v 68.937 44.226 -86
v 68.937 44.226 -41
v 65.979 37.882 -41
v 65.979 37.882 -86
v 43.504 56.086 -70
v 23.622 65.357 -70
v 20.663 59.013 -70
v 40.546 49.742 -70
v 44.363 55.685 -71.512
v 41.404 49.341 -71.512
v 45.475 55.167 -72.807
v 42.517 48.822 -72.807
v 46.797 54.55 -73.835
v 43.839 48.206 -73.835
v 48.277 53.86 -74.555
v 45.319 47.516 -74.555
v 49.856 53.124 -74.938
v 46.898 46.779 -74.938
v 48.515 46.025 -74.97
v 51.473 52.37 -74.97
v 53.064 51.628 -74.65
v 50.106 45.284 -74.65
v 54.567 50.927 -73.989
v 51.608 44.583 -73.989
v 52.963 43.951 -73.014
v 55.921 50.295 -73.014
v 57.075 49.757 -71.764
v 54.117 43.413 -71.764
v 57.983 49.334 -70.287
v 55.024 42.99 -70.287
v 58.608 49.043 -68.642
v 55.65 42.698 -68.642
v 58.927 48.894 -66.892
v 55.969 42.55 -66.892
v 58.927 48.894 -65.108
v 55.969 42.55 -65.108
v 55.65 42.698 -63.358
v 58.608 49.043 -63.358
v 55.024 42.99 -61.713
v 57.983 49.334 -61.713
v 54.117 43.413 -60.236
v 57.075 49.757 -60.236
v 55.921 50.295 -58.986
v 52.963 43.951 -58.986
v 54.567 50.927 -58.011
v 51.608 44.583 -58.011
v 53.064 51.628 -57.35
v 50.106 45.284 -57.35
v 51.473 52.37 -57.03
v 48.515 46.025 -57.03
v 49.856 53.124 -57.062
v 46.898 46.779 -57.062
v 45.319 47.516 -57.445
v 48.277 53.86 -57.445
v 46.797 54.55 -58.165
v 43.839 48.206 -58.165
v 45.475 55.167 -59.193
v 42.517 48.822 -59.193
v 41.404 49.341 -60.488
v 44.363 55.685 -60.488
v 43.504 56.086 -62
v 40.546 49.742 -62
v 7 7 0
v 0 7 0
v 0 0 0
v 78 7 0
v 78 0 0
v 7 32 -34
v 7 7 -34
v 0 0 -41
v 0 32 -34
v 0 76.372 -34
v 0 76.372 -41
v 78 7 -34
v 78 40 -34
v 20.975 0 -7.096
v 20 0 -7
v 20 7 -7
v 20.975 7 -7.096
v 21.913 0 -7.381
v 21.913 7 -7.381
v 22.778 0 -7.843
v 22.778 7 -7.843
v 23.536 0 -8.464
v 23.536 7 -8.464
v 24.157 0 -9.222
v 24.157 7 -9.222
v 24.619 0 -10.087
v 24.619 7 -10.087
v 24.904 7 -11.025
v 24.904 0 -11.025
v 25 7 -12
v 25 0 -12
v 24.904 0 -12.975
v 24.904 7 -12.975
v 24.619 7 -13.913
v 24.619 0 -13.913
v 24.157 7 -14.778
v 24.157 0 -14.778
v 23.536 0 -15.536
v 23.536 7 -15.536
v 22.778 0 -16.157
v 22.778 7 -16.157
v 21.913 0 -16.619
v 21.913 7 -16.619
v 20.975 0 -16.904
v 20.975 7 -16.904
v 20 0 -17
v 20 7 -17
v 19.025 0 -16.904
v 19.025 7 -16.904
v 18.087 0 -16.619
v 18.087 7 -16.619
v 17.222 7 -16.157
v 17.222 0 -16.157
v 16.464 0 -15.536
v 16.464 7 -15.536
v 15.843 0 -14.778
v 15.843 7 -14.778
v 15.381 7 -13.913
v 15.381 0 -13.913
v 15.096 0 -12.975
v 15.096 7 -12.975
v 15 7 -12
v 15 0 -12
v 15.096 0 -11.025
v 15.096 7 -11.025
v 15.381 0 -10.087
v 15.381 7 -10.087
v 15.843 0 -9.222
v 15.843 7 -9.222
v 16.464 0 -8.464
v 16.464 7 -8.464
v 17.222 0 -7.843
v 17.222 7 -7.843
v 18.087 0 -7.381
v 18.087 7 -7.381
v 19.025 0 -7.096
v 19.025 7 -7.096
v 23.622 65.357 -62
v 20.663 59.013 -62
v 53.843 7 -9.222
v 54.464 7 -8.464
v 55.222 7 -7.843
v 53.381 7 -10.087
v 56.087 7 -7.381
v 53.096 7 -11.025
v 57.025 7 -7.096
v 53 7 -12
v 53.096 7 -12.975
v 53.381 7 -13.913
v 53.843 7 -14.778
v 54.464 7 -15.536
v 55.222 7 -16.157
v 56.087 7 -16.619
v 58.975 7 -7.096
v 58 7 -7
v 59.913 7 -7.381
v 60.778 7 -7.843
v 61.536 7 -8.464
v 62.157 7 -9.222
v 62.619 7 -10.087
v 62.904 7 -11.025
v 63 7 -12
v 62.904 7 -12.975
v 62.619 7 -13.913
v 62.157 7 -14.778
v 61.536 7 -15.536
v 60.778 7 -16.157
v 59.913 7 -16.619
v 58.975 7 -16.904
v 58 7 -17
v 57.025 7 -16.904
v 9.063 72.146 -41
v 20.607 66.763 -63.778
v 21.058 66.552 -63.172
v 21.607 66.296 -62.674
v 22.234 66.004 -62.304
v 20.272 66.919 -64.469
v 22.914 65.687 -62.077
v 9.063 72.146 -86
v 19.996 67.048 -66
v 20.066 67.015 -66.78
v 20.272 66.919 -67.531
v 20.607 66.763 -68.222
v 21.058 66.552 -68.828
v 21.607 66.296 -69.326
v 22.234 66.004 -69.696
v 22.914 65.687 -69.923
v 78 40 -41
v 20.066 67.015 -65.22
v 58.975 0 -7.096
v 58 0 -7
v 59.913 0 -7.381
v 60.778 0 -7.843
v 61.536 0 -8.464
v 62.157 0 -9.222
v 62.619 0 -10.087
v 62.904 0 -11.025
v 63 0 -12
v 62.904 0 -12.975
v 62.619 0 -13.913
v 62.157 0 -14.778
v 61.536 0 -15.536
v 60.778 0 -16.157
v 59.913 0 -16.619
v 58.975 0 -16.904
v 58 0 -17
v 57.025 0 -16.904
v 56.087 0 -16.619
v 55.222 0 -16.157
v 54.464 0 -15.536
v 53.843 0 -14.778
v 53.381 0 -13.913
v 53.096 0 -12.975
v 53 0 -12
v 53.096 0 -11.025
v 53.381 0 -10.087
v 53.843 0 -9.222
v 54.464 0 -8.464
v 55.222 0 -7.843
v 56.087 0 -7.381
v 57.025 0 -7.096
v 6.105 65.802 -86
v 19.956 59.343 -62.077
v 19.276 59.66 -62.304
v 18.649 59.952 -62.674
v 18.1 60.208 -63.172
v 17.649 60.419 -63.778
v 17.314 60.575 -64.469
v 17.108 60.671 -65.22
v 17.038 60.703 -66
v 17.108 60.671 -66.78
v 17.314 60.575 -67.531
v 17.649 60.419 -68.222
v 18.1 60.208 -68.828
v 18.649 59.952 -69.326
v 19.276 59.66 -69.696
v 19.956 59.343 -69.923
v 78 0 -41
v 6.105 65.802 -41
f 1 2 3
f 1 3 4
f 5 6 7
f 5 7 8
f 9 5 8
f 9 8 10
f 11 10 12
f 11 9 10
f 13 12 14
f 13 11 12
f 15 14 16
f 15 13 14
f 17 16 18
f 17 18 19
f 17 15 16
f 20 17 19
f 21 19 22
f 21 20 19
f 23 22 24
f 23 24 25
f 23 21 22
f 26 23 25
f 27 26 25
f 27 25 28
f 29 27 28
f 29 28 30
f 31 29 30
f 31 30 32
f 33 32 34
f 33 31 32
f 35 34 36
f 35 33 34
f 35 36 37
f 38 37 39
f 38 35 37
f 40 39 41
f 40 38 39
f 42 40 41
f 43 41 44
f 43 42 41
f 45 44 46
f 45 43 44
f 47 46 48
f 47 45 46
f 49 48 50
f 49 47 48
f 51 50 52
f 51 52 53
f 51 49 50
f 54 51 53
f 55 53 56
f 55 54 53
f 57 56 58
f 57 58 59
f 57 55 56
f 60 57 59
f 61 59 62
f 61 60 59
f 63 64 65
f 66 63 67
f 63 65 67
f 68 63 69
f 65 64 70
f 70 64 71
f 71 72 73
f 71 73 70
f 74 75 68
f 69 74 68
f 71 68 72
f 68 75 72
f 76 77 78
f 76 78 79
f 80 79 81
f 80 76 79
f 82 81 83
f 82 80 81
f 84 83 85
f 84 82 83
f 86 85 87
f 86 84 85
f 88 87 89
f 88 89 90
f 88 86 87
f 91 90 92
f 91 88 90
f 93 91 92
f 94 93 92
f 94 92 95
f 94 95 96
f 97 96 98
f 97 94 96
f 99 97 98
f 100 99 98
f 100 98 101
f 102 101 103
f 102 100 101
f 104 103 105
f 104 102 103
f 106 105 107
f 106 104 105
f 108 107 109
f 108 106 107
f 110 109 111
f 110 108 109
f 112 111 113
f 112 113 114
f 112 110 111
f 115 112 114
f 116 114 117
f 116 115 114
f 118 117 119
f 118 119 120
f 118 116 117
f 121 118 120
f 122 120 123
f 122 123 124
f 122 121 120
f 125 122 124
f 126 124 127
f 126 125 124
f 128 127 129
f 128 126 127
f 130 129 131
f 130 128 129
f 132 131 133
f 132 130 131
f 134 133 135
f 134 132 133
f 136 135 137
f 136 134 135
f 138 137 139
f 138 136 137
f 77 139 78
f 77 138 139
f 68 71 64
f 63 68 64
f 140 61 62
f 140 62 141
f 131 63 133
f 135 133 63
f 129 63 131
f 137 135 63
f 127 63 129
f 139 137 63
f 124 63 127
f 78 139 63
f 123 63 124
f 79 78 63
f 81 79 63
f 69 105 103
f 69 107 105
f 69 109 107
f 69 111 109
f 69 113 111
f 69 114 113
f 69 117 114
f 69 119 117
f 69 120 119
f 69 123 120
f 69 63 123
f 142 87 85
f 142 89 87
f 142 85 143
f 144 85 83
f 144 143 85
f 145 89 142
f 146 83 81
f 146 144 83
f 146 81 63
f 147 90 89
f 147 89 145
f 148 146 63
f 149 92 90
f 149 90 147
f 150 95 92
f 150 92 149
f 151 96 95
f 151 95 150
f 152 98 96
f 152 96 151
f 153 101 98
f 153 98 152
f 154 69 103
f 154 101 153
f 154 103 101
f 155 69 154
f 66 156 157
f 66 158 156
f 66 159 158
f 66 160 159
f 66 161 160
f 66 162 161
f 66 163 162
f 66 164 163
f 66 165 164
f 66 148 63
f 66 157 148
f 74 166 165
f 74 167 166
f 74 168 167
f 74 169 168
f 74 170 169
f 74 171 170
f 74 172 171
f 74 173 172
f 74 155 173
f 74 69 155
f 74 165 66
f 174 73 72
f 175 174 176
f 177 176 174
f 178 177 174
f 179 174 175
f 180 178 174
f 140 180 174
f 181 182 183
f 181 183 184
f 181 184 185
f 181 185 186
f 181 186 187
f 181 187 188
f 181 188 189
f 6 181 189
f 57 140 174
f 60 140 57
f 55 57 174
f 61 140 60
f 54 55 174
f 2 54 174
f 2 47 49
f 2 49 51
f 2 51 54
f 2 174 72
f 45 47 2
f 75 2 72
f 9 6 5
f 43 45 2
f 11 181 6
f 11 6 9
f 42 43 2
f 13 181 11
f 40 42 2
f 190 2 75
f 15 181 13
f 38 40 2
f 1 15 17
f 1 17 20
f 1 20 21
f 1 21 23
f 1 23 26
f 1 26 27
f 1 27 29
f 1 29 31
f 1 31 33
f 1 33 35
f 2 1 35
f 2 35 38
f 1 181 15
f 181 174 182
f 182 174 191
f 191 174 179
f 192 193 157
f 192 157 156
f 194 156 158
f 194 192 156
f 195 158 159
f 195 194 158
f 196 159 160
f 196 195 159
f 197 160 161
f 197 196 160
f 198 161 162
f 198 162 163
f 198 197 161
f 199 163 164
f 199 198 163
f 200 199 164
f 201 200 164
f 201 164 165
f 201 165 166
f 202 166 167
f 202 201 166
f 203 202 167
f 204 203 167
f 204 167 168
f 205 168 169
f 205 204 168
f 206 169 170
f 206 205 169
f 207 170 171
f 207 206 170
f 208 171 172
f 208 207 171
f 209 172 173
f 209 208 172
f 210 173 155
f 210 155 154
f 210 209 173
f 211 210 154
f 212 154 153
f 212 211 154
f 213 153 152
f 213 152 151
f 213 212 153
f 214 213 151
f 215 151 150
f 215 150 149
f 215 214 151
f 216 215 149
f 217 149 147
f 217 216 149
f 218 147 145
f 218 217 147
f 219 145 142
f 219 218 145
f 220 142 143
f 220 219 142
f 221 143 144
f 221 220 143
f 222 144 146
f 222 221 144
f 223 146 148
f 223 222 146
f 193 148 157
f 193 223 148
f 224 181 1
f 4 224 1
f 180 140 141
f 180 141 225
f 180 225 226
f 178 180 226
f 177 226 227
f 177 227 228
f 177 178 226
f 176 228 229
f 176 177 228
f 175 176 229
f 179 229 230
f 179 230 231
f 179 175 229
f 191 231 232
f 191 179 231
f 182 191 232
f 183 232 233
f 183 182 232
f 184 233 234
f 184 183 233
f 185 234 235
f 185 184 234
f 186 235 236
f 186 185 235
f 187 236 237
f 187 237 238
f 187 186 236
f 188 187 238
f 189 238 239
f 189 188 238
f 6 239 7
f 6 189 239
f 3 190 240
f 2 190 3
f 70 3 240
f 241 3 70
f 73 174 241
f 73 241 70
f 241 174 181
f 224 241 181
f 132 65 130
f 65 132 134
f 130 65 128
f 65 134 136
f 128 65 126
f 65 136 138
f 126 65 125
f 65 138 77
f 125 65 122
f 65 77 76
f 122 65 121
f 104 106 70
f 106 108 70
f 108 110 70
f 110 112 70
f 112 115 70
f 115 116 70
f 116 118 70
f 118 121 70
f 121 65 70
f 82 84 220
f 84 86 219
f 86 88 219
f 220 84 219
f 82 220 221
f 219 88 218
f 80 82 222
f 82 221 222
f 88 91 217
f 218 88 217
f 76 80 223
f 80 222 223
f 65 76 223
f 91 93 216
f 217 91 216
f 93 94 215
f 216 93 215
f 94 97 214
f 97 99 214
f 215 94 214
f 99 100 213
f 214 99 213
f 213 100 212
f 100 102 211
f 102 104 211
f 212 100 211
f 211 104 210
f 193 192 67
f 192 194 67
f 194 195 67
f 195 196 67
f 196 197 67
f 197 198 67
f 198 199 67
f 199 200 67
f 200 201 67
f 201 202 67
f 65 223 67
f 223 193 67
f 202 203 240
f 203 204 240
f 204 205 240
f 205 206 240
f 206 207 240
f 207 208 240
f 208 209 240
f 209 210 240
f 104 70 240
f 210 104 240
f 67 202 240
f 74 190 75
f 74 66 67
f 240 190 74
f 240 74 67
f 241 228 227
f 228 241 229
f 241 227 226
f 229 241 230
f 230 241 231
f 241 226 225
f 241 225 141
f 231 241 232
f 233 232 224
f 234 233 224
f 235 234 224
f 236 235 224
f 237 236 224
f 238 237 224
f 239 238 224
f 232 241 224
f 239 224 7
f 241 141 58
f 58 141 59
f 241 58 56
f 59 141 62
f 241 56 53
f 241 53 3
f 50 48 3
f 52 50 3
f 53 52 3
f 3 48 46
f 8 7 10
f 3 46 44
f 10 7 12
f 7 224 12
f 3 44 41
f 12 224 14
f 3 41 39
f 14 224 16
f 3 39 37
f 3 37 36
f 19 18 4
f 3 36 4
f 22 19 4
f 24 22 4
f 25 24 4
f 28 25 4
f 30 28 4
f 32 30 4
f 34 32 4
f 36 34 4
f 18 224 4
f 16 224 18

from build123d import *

# Parameters (mm, degrees)
SKETCH1_W           = 78
SKETCH1_H           = 41
SKETCH1_R           = 5
BOSS_EXTRUDE1_DEPTH = 7
BOSS_EXTRUDE3_START = -41
BOSS_EXTRUDE3_DEPTH = 7
BOSS_EXTRUDE6_DEPTH = 7
SKETCH10_W          = 66.063477679
SKETCH10_H          = 45
BOSS_EXTRUDE7_DEPTH = 7


with BuildPart() as part:
    # Sketch1 → Boss-Extrude1 (new body)
    with BuildSketch(Plane(origin=(0, 0, 0), x_dir=(1, 0, 0), z_dir=(0, 1, 0))):
        with Locations((39, 20.5)):
            Rectangle(SKETCH1_W, SKETCH1_H)
        with Locations(Location((20, 12, 0), (0, 0, 270))):
            Circle(SKETCH1_R, mode=Mode.SUBTRACT)
        with Locations(Location((58, 12, 0), (0, 0, 270))):
            Circle(SKETCH1_R, mode=Mode.SUBTRACT)
    extrude(amount=BOSS_EXTRUDE1_DEPTH)

    # Sketch5 → Boss-Extrude3 (add)
    with BuildSketch(Plane.XY.offset(BOSS_EXTRUDE3_START)):
        Polygon((0, 7), (0, 76.371997336), (78, 40), (78, 7), align=None)
    extrude(amount=BOSS_EXTRUDE3_DEPTH)

    # Sketch6 → Boss-Extrude6 (add)
    with BuildSketch(Plane(origin=(0, 0, 0), x_dir=(0, 0, -1), z_dir=(1, 0, 0))):
        Polygon((34, 7), (34, 32), (0, 7), align=None)
    extrude(amount=BOSS_EXTRUDE6_DEPTH)

    # Sketch10 → Boss-Extrude7 (add)
    with BuildSketch(Plane(origin=(29.252172085, 62.731485475, 0), x_dir=(0.9063077870366529, -0.4226182617406933, 0), z_dir=(0.4226182617406933, 0.9063077870366529, 0))):
        with Locations((10.755538079, 63.5)):
            Rectangle(SKETCH10_W, SKETCH10_H)
        with BuildLine():
            Line((-6.212723081, 70), (15.725019171, 70))
            ThreePointArc((15.725019171, 70), (32.787276919, 66), (15.725019171, 62))
            Line((15.725019171, 62), (-6.212723081, 62))
            ThreePointArc((-6.212723081, 62), (-10.212723081, 66), (-6.212723081, 70))
        make_face(mode=Mode.SUBTRACT)
    extrude(amount=-BOSS_EXTRUDE7_DEPTH)


solid = part.part
